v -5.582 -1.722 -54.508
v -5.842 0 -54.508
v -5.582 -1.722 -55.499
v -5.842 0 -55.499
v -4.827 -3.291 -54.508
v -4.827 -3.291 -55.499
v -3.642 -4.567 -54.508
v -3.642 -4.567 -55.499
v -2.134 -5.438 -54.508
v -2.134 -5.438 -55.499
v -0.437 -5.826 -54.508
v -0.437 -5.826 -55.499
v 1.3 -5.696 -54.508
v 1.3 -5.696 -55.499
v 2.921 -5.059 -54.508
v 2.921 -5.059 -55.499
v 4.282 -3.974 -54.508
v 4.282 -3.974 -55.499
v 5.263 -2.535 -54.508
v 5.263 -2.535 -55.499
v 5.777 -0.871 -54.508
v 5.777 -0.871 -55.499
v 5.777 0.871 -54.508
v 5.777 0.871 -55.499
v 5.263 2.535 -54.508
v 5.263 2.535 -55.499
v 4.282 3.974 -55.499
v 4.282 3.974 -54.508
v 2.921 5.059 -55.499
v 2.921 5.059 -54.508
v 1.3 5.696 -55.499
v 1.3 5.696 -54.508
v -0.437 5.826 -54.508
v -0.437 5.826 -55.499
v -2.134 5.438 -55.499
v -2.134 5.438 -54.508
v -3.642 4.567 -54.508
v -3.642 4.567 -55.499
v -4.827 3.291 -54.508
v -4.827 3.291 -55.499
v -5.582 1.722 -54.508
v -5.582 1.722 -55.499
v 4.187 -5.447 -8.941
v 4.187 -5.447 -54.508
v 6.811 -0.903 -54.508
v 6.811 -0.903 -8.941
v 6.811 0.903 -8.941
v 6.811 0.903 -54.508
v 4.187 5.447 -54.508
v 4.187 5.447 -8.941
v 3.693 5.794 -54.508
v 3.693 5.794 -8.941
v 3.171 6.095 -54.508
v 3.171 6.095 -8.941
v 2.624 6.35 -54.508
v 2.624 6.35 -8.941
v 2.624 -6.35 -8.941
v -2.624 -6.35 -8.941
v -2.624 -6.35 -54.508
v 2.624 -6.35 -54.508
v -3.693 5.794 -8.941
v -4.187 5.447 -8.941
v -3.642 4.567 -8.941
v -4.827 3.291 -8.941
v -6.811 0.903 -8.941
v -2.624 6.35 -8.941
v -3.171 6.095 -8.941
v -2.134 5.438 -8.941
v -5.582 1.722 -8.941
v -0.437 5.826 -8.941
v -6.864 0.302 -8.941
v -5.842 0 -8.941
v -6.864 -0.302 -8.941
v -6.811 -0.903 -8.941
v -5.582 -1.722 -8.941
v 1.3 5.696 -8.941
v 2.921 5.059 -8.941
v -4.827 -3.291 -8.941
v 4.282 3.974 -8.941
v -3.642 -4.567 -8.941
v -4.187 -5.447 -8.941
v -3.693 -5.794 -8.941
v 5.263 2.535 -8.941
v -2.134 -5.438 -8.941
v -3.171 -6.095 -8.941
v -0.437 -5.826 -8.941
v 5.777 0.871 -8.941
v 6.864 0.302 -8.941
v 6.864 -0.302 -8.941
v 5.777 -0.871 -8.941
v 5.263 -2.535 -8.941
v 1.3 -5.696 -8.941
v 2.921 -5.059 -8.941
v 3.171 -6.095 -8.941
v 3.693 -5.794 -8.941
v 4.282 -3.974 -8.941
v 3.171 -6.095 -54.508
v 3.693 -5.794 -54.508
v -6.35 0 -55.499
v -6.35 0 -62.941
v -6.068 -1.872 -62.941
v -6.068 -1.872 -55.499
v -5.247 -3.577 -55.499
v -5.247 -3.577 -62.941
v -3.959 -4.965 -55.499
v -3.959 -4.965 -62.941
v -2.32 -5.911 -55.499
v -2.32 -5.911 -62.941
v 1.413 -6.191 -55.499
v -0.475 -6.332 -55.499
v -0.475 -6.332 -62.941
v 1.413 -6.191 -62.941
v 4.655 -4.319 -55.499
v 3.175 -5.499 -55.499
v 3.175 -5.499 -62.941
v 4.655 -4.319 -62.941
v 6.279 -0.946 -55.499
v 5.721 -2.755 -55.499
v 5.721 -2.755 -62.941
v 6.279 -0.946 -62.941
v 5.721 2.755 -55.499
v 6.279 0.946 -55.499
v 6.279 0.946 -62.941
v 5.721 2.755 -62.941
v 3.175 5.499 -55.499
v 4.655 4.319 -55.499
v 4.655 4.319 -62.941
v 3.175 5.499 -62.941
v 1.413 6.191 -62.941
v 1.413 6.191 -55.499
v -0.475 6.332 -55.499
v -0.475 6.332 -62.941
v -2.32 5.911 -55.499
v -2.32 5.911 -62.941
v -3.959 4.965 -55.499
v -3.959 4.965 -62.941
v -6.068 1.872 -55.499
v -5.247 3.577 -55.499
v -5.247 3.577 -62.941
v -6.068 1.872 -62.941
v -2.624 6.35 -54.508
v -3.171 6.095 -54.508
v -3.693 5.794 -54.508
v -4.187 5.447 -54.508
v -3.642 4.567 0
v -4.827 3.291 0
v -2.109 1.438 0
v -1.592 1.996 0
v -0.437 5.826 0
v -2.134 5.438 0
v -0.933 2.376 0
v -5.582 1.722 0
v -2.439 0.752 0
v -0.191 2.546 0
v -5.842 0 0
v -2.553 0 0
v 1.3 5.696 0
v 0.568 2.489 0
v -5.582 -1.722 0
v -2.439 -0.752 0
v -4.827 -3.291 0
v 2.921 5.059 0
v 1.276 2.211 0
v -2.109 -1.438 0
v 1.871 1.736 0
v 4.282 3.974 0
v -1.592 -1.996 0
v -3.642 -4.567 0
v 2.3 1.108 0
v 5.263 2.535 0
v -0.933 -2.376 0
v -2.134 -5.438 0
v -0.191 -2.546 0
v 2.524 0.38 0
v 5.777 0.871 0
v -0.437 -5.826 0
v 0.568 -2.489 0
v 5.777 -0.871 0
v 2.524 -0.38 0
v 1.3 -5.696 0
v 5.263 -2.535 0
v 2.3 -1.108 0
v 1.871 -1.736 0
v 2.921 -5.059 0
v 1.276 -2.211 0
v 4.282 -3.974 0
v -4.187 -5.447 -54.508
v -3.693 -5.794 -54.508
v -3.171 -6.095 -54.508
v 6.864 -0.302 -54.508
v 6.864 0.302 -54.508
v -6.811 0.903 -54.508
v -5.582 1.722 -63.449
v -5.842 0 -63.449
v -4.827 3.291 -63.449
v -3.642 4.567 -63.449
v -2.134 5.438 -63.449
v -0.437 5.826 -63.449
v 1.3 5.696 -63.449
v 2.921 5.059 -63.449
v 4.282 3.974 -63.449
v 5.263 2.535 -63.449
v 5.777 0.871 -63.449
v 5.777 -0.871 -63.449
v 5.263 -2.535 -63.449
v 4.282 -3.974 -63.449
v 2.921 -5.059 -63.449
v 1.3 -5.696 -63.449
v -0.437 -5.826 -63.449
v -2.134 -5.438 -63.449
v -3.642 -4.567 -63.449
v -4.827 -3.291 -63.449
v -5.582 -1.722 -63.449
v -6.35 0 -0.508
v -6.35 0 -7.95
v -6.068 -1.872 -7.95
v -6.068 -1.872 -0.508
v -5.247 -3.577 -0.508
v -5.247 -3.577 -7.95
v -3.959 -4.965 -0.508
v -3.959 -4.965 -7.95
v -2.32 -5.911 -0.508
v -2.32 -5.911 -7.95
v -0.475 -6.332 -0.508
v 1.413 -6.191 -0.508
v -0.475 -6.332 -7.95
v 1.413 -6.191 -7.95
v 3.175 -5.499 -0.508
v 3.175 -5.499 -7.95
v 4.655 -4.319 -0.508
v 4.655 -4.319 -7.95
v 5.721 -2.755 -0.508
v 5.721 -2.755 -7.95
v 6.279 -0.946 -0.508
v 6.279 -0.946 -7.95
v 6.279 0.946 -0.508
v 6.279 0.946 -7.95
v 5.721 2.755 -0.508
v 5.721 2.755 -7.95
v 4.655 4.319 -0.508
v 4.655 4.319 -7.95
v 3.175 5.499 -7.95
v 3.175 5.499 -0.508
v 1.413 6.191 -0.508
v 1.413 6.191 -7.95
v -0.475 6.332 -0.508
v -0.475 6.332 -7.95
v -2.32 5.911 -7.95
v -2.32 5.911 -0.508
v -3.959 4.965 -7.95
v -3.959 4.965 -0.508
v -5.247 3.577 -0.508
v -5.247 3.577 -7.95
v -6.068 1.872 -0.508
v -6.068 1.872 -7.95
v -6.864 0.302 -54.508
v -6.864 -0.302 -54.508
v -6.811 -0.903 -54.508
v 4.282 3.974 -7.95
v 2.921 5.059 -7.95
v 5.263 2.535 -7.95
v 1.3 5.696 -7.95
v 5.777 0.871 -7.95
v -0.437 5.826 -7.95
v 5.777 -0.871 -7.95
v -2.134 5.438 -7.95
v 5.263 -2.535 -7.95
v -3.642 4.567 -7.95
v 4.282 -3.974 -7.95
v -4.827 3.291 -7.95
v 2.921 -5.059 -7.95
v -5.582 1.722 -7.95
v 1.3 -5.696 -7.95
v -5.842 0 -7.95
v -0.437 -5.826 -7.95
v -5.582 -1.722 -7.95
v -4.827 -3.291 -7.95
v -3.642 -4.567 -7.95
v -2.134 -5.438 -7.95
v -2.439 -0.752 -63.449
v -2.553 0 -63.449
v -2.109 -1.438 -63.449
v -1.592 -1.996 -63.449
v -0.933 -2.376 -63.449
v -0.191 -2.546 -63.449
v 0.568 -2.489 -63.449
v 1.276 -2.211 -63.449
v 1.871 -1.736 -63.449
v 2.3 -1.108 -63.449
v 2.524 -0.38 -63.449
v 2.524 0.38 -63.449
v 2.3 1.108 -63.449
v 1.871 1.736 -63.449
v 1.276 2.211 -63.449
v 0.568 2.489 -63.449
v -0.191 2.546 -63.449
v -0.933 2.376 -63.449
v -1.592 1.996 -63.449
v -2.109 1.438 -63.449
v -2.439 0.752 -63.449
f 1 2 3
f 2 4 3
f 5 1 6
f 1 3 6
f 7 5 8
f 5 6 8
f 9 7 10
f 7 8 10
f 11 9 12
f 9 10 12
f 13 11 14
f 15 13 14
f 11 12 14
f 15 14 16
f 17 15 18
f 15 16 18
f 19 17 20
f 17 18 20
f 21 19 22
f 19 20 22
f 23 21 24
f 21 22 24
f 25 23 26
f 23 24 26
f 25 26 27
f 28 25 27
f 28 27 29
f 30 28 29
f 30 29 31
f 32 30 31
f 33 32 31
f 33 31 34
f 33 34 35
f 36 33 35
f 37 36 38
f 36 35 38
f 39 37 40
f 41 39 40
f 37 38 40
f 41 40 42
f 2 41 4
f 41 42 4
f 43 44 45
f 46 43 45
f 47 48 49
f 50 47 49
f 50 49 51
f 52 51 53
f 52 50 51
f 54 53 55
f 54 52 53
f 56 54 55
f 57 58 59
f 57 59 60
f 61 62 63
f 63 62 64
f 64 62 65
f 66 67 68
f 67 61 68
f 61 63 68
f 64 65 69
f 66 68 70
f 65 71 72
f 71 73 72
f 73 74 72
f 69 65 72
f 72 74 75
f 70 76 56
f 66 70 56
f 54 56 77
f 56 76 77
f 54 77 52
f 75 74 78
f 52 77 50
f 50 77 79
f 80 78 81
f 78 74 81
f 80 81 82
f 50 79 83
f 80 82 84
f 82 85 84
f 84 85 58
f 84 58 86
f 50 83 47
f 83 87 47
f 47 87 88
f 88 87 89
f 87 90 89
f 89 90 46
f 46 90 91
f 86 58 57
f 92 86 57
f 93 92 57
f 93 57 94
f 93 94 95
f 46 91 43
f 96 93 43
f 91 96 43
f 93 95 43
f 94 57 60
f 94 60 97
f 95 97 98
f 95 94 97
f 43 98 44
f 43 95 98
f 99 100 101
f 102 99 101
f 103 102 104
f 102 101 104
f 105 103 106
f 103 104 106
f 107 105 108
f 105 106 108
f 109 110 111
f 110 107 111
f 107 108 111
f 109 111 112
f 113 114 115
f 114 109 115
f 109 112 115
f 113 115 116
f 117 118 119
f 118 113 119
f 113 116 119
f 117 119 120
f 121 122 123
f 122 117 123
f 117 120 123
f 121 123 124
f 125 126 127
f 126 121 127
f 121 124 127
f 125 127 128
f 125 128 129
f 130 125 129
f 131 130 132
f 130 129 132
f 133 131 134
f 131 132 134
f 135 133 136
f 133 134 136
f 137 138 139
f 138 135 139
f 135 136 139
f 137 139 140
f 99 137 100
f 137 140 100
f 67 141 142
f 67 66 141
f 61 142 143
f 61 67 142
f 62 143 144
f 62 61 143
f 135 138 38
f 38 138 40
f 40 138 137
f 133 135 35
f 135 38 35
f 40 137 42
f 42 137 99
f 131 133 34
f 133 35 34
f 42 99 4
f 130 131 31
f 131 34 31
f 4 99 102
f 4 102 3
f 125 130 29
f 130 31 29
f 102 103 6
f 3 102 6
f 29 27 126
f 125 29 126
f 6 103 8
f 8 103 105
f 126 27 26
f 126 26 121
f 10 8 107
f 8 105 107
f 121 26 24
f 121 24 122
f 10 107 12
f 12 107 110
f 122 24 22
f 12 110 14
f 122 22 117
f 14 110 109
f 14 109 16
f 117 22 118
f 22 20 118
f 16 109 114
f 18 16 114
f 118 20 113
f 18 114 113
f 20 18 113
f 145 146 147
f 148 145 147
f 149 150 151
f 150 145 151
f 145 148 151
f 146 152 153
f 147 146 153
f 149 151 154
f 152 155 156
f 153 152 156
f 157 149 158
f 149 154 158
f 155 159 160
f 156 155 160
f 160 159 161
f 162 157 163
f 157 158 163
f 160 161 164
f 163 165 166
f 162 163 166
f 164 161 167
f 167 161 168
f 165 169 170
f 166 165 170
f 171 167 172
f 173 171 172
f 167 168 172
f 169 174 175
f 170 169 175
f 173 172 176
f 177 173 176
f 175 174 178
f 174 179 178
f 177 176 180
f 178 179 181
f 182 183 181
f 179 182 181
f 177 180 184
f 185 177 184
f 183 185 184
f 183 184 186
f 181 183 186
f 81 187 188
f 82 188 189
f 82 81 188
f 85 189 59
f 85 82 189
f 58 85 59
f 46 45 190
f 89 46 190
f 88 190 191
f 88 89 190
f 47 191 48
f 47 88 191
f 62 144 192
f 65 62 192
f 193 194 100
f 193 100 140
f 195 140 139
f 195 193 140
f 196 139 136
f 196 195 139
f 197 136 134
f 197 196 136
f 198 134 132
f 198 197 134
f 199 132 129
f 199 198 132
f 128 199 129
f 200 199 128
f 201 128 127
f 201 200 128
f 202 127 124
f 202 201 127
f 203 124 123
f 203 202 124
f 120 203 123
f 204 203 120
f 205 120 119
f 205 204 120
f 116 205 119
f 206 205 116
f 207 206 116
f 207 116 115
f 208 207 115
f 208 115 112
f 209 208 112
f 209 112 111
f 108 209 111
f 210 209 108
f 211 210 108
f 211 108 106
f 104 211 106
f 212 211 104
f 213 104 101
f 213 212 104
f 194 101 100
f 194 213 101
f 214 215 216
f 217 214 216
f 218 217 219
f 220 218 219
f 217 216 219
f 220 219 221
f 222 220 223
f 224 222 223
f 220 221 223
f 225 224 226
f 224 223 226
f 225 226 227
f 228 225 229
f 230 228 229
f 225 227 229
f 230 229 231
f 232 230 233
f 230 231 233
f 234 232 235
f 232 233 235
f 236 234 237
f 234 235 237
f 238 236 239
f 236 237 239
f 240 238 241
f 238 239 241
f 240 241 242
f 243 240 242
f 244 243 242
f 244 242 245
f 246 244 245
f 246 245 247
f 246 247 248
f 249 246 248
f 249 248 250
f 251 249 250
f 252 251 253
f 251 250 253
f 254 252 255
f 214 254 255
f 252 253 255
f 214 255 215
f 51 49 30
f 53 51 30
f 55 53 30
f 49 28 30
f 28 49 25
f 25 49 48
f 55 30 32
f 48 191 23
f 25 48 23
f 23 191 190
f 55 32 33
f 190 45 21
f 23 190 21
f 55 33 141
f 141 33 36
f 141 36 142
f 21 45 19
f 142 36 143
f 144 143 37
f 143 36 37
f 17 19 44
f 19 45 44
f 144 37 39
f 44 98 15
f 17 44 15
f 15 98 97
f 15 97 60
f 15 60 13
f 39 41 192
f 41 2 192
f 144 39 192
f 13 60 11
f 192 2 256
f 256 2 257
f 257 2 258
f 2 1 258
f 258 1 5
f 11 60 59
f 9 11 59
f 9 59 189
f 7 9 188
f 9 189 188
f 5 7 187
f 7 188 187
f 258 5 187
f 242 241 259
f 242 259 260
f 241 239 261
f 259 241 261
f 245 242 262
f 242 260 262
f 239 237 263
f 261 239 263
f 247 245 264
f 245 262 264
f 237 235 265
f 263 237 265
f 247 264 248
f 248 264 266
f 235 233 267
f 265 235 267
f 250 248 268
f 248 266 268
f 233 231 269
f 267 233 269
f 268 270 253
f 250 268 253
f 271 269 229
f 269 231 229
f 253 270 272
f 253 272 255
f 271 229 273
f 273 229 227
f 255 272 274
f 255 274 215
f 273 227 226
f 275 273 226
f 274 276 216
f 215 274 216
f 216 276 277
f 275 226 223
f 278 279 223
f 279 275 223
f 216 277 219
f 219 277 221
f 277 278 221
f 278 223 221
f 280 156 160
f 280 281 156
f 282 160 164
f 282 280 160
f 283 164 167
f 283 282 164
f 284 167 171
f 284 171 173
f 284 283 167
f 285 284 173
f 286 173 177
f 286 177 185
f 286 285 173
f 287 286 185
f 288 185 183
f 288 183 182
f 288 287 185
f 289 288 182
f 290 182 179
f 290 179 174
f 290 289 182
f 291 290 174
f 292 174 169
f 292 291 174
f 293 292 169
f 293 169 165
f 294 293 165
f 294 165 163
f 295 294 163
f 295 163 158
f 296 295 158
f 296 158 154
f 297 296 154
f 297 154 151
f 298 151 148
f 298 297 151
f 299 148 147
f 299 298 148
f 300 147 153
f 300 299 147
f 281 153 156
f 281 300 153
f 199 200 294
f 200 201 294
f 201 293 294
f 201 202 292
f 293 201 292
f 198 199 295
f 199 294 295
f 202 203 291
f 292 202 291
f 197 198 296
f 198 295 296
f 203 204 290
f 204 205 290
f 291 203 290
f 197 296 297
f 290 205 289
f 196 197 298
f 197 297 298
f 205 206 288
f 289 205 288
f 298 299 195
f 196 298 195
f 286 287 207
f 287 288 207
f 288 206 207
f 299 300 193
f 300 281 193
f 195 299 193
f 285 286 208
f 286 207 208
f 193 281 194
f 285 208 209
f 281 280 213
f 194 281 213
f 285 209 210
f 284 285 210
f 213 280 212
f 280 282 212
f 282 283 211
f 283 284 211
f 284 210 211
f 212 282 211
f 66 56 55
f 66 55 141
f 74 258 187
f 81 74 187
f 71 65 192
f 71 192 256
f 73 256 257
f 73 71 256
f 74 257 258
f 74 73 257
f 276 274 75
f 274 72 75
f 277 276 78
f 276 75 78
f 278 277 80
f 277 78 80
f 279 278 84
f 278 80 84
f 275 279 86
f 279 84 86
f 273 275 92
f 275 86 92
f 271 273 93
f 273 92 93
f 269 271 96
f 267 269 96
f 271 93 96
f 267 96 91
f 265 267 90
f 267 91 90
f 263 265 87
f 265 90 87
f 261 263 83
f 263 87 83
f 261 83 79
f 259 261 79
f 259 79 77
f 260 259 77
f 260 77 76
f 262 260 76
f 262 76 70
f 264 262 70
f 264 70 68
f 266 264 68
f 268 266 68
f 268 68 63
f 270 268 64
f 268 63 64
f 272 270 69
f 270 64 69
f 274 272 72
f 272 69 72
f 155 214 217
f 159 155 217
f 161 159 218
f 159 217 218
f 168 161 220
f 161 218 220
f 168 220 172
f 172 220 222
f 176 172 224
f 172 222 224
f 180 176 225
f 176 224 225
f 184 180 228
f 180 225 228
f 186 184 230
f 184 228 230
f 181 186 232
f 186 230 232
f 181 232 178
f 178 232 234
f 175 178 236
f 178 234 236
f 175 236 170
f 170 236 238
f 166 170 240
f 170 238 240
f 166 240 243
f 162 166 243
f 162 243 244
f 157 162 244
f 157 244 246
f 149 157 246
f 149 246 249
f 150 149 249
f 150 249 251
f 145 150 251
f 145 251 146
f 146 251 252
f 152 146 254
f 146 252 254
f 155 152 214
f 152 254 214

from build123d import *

# Parameters (mm, degrees)
SKETCH2_OUTSIDE_W  = 29.014
SKETCH2_OUTSIDE_H  = 29.014
CUT_EXTRUDE1_DEPTH = 56.367668431
CHAMFER1_SIZE      = 0.508


with BuildPart() as part:
    # Sketch1 → Revolve1 (revolve)
    with BuildSketch(Plane(origin=(0, 0, 0), x_dir=(0, 0, -1), z_dir=(1, 0, 0)), mode=Mode.PRIVATE) as revolve1_sk:
        Polygon((0, 2.5527), (0, 6.35), (7.9502, 6.35), (7.9502, 5.842), (8.9408, 5.842), (8.9408, 6.8707), (19.88570353, 6.8707), (54.5084, 6.8707), (54.5084, 5.842), (55.499, 5.842), (55.499, 6.35), (63.4492, 6.35), (63.4492, 2.5527), (19.88570353, 2.5527), align=None)
    revolve(revolve1_sk.sketch.rotate(Axis((0, 0, 0), (0, 0, 1)), 90), axis=Axis((0, 0, 0), (0, 0, 1)))

    # Sketch2 outside → Cut-Extrude1 (cut, through all)
    with BuildSketch(Plane.XY.offset(-8.9408)):
        Rectangle(SKETCH2_OUTSIDE_W, SKETCH2_OUTSIDE_H)
        Polygon((-3.666174209, 6.35), (-7.332348419, 0), (-3.666174209, -6.35), (3.666174209, -6.35), (7.332348419, 0), (3.666174209, 6.35), align=None, mode=Mode.SUBTRACT)
    extrude(amount=-CUT_EXTRUDE1_DEPTH, mode=Mode.SUBTRACT)

    # Chamfer1
    chamfer1_edges = [part.edges().sort_by_distance(p)[0] for p in [
        (6.35, 0, -63.4492),
        (6.35, 0, 0),
    ]]
    chamfer(chamfer1_edges, length=CHAMFER1_SIZE)


solid = part.part
